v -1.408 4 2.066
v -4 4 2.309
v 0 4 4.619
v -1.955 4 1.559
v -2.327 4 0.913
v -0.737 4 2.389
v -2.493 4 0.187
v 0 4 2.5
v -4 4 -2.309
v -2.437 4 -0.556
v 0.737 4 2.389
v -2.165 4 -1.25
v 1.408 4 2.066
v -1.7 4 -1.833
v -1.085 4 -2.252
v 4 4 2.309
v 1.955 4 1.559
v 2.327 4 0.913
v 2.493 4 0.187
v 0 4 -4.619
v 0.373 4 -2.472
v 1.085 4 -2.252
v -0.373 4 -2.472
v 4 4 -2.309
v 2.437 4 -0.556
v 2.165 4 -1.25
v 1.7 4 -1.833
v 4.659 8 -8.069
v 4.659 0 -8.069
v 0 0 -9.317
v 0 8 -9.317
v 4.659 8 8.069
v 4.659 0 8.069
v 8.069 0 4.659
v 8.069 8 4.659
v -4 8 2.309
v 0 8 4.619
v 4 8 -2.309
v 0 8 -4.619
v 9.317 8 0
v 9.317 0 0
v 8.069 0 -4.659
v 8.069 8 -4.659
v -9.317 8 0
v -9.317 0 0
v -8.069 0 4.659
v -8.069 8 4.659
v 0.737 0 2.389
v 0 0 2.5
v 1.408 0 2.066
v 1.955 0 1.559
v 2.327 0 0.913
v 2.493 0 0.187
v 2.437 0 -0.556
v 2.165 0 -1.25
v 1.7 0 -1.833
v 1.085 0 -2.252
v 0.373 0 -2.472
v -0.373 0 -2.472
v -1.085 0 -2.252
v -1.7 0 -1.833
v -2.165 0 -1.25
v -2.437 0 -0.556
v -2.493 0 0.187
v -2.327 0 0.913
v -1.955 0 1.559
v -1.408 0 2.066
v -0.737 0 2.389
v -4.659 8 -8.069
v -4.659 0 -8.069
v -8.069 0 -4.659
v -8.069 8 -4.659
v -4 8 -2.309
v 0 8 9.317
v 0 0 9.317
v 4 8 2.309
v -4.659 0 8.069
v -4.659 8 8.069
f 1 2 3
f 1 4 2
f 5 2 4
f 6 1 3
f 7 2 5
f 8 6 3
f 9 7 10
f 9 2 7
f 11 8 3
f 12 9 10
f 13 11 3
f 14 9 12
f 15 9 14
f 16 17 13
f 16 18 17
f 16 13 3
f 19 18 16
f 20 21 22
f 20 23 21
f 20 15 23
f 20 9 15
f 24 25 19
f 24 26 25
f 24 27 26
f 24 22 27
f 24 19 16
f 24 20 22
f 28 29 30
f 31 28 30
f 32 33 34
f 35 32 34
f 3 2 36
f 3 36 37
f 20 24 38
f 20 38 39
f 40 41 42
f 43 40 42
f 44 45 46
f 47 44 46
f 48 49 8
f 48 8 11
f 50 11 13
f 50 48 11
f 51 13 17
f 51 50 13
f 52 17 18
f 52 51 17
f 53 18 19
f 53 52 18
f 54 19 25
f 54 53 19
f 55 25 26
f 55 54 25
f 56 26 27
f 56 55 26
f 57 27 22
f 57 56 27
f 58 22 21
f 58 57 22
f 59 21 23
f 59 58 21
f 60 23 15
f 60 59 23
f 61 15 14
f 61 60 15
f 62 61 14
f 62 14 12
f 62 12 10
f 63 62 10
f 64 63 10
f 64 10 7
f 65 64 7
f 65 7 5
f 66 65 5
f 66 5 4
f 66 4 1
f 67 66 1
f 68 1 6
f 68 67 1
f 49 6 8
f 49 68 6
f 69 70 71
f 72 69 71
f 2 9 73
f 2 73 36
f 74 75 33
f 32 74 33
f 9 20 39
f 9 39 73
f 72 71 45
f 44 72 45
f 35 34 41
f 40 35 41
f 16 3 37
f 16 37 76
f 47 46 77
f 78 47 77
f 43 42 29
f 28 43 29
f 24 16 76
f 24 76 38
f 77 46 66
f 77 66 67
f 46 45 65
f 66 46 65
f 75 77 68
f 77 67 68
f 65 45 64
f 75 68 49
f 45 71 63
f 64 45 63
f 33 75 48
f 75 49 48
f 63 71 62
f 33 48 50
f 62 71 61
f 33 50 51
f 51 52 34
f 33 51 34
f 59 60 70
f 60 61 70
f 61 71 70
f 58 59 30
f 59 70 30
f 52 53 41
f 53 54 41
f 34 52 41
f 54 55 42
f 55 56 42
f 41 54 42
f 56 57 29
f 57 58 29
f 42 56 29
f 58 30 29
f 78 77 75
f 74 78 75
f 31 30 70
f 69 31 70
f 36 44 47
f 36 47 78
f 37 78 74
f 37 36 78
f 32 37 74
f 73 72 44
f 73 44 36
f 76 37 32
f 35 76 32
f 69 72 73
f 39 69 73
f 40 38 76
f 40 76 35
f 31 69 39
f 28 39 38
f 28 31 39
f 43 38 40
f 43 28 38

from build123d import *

# Parameters (mm, degrees)
RESSALTO_EXTRUS_O1_DEPTH = 8
ESBO_O1_3_R              = 2.5
RESSALTO_EXTRUS_O2_DEPTH = 4


with BuildPart() as part:
    # Esboço1 → Ressalto-extrusão1 (new body)
    with BuildSketch(Plane(origin=(0, 0, 0), x_dir=(1, 0, 0), z_dir=(0, 1, 0))):
        Polygon((4.658742812, 8.06917925), (0, 9.317485624), (-4.658742812, 8.06917925), (-8.06917925, 4.658742812), (-9.317485624, 0), (-8.06917925, -4.658742812), (-4.658742812, -8.06917925), (0, -9.317485624), (4.658742812, -8.06917925), (8.06917925, -4.658742812), (9.317485624, 0), (8.06917925, 4.658742812), align=None)
        Polygon((0, 4.618802154), (4, 2.309401077), (4, -2.309401077), (0, -4.618802154), (-4, -2.309401077), (-4, 2.309401077), align=None, mode=Mode.SUBTRACT)
    extrude(amount=RESSALTO_EXTRUS_O1_DEPTH)

    # Esboço1<3> → Ressalto-extrusão2 (add)
    with BuildSketch(Plane(origin=(0, 0, 0), x_dir=(1, 0, 0), z_dir=(0, 1, 0))):
        Polygon((4, 2.309401077), (0, 4.618802154), (-4, 2.309401077), (-4, -2.309401077), (0, -4.618802154), (4, -2.309401077), align=None)
        Circle(ESBO_O1_3_R, mode=Mode.SUBTRACT)
    extrude(amount=RESSALTO_EXTRUS_O2_DEPTH)


solid = part.part
